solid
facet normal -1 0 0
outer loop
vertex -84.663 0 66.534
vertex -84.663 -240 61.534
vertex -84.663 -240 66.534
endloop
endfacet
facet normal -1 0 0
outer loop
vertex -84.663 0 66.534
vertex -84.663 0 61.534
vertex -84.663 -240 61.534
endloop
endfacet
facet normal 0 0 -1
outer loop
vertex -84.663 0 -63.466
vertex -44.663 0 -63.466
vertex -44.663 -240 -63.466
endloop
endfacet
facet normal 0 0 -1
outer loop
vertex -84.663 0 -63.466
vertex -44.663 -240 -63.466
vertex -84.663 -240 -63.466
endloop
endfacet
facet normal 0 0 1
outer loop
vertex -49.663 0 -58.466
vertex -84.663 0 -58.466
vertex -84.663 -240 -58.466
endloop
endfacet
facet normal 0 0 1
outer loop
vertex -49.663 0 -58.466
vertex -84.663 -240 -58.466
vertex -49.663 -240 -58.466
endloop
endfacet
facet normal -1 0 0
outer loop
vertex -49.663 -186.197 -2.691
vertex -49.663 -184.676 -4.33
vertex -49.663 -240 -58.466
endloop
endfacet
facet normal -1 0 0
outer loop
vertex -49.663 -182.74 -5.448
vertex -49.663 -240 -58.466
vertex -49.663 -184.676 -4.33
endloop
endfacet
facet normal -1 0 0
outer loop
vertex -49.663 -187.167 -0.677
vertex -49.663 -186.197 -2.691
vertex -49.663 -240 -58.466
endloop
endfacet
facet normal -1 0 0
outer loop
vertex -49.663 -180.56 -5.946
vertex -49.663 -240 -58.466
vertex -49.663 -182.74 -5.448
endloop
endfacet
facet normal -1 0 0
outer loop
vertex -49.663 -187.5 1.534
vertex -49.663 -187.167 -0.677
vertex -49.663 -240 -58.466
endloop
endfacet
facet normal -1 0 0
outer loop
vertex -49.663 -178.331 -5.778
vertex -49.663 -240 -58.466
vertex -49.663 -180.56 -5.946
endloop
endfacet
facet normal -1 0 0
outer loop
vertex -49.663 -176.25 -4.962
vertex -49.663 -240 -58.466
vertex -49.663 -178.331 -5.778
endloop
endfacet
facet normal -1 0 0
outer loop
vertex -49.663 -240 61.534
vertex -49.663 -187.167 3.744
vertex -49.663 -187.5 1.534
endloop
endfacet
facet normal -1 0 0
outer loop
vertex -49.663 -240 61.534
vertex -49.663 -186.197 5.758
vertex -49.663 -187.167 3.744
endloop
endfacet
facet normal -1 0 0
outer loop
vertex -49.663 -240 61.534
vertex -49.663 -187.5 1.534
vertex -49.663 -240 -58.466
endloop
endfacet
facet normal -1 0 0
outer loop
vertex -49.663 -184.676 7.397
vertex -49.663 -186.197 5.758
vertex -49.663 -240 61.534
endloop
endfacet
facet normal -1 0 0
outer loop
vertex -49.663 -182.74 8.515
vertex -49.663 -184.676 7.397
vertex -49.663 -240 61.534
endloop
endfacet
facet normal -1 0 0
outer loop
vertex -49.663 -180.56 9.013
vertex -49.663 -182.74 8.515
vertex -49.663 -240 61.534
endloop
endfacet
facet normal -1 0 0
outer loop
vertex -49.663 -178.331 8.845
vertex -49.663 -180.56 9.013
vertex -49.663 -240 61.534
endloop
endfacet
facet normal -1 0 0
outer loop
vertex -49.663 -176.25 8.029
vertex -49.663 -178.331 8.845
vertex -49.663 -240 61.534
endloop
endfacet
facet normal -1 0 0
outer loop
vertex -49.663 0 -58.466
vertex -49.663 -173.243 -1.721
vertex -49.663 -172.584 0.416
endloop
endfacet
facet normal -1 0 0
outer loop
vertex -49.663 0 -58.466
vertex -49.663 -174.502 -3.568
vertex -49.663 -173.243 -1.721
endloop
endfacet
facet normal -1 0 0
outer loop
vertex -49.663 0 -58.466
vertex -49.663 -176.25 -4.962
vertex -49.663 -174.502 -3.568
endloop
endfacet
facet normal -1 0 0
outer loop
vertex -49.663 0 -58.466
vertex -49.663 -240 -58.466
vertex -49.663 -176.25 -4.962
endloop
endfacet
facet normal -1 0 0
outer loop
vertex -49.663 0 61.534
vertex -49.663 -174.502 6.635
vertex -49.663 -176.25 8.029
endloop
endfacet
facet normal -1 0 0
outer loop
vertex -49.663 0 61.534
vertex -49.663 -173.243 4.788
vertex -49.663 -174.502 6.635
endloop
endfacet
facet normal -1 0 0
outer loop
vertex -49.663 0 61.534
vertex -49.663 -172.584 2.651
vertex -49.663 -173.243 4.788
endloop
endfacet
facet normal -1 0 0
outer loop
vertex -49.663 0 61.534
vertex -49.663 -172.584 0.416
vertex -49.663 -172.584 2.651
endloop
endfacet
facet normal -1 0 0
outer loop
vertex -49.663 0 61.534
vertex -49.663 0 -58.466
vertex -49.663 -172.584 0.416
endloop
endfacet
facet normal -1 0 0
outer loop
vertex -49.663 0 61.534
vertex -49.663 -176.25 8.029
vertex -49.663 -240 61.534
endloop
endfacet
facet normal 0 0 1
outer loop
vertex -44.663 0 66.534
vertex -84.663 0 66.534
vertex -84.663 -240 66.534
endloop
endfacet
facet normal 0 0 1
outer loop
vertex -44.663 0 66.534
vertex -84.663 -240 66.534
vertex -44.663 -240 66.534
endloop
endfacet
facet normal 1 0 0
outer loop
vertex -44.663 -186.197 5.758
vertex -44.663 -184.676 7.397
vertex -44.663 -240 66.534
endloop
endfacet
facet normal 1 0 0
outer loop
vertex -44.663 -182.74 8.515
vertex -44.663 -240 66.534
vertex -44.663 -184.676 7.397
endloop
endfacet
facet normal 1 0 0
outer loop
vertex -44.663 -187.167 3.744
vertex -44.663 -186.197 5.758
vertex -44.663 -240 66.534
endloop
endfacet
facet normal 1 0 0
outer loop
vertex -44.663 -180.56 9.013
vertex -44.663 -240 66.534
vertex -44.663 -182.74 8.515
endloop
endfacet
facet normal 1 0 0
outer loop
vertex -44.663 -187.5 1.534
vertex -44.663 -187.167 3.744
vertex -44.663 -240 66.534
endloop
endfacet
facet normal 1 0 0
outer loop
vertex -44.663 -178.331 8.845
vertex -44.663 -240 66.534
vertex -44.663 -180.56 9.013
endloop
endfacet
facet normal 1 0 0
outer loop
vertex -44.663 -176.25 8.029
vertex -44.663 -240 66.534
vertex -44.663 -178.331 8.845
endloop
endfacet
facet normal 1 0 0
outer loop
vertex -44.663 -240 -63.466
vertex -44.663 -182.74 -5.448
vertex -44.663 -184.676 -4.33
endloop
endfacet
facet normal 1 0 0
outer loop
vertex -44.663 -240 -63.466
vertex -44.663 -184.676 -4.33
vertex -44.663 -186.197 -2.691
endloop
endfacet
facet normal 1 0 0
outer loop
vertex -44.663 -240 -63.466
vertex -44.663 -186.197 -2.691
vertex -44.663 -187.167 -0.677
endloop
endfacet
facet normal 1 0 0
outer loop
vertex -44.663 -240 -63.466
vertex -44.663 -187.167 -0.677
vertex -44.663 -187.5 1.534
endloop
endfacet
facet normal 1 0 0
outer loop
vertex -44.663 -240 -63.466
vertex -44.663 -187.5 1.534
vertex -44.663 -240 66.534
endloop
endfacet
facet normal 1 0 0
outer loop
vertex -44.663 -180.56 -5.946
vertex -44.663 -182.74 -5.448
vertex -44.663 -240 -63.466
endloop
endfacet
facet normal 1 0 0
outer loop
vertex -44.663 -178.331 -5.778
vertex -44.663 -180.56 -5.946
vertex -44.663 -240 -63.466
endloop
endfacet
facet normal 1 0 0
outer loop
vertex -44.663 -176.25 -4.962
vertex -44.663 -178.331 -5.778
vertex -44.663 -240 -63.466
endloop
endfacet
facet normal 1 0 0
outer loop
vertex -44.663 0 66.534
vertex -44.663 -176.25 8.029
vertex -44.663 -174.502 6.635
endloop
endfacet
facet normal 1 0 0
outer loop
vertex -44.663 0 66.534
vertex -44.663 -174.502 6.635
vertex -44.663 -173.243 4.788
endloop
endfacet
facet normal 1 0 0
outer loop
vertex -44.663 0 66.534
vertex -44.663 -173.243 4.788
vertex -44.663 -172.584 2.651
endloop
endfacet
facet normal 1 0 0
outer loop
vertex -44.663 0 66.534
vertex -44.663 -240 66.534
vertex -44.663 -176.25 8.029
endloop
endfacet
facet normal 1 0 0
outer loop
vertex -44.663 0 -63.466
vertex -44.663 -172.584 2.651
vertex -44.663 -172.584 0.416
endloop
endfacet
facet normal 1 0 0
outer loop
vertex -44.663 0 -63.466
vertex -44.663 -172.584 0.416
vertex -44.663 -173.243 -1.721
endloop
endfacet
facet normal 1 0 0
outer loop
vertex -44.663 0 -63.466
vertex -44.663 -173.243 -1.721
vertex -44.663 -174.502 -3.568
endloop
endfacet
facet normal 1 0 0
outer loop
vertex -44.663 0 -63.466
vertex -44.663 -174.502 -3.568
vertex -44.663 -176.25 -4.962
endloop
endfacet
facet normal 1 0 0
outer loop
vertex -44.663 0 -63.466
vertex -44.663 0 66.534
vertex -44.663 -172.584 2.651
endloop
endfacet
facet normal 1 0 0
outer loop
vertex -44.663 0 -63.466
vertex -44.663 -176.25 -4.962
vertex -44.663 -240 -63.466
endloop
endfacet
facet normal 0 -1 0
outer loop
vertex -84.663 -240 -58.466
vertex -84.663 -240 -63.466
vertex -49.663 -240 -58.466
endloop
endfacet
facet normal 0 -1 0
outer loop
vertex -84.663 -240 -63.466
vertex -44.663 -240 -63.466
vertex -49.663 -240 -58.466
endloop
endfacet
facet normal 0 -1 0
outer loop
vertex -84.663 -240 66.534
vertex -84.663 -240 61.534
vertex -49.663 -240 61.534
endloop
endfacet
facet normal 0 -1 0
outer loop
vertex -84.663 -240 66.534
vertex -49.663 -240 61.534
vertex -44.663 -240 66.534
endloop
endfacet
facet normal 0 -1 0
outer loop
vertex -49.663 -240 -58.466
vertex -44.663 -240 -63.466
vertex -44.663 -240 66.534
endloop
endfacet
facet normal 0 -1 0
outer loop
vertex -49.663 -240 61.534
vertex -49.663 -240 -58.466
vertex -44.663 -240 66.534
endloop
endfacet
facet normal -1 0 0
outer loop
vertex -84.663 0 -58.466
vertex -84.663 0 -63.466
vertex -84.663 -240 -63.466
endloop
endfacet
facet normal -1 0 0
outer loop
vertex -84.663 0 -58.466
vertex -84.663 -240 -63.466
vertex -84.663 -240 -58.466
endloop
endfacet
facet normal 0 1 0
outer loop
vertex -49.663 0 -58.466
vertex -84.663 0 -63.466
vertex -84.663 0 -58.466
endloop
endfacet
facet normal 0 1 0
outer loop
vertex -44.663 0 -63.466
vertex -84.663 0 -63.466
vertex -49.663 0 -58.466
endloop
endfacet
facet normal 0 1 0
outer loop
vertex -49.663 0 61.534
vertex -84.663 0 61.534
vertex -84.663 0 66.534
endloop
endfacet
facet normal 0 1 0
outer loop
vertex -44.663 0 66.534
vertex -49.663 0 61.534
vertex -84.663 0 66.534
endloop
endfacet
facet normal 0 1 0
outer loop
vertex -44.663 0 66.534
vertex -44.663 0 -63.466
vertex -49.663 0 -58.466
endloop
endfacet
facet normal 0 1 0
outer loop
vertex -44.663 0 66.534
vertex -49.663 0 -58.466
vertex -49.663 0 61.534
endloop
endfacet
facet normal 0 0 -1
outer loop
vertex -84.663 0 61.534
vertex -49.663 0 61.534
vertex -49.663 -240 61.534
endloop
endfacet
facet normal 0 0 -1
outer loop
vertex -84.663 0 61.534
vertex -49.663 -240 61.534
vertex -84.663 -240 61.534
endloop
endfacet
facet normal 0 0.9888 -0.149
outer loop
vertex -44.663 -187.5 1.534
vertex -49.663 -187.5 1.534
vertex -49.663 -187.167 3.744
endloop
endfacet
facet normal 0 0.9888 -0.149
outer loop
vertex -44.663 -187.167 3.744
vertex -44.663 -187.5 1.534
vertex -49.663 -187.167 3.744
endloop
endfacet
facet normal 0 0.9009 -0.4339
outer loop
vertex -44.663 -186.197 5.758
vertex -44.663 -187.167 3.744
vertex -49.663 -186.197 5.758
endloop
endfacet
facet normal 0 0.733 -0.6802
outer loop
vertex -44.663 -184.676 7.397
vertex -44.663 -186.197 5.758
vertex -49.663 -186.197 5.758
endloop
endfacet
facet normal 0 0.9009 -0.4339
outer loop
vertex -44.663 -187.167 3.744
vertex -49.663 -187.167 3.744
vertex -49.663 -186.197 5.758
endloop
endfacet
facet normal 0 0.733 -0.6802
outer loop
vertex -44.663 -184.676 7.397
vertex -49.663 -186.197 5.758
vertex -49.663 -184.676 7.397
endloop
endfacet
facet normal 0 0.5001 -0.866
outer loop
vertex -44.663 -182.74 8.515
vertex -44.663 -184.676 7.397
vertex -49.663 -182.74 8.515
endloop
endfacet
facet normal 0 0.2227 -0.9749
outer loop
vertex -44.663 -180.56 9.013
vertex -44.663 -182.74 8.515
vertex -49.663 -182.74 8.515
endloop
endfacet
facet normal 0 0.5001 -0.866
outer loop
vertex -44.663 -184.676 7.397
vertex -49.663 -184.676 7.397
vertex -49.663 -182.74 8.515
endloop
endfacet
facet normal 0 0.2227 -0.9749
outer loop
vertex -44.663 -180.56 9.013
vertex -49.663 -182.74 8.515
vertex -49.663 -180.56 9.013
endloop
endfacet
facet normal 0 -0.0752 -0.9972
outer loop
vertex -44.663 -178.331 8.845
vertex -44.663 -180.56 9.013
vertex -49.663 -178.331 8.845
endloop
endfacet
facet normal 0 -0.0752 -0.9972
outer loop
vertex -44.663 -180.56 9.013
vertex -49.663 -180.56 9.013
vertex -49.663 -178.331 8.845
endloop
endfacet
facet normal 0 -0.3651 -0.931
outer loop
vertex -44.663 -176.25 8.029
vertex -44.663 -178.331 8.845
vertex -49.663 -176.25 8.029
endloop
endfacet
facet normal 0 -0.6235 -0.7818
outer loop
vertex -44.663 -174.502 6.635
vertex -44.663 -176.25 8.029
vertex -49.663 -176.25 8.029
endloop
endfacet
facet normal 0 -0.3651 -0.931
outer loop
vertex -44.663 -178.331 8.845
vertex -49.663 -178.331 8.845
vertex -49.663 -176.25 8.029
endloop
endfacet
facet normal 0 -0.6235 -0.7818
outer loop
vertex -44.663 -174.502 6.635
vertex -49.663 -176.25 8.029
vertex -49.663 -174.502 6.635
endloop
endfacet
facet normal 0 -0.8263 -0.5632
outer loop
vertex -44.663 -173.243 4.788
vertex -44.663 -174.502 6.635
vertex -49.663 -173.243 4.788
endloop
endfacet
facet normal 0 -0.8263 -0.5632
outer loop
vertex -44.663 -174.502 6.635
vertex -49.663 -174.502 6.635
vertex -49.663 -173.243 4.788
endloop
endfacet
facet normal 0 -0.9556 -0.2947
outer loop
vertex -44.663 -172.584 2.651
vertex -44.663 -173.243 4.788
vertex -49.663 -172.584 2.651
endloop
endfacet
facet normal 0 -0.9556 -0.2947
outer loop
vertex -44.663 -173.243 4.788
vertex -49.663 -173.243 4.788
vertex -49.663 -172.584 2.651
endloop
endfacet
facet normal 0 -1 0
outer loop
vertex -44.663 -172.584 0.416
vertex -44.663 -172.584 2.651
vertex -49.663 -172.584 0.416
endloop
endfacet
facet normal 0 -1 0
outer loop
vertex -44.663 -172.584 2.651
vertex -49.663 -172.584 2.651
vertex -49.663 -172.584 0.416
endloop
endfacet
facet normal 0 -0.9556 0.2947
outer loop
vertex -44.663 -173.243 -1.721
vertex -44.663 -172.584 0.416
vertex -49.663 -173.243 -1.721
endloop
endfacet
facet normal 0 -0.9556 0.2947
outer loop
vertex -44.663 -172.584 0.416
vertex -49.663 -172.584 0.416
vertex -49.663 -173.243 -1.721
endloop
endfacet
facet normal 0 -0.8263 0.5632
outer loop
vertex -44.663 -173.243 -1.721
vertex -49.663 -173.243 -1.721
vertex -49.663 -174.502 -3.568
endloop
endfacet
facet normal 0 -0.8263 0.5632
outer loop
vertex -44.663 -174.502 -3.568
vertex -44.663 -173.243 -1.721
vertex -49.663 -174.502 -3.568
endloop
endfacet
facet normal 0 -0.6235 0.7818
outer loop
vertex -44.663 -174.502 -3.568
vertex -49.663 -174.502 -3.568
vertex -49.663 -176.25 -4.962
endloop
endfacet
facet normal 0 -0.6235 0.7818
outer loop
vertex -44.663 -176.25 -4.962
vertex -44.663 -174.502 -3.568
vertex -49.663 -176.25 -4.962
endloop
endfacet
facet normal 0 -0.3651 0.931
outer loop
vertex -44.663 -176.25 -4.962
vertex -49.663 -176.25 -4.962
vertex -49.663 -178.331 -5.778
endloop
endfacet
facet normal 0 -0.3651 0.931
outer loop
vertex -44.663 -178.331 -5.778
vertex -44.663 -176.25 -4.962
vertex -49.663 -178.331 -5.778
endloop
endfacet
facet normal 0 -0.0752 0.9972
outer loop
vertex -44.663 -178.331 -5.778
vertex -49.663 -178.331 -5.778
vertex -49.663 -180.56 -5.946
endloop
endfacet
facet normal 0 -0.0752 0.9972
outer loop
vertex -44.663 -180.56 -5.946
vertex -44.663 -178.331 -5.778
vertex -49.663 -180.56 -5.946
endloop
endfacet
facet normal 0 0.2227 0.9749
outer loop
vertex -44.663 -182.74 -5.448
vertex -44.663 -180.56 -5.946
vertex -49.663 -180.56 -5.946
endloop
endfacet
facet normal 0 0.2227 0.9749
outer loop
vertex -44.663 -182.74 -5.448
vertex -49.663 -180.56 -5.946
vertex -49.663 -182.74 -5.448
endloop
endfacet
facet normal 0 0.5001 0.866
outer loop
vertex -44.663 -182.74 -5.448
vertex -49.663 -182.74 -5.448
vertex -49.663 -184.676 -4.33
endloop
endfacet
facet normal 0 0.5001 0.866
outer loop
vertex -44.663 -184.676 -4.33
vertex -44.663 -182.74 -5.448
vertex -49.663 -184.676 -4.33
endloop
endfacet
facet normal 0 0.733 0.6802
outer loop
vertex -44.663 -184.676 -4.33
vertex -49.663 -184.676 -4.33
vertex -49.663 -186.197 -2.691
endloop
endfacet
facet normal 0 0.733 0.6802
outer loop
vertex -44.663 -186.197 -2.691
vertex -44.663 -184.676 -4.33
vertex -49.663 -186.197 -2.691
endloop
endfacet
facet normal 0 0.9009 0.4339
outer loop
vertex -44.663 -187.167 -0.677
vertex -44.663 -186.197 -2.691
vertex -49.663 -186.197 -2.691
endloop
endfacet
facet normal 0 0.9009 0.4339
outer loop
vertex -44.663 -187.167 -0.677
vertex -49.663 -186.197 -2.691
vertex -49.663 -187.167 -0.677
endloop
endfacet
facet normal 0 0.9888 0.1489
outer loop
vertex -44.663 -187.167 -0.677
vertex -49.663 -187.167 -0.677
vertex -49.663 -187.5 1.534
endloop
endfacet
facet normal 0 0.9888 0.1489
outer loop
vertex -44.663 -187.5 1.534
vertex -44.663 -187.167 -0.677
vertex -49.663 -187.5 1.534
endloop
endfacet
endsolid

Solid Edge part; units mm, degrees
sketch "Sketch1" plane through (0, 0, 0) normal (0, -1, 0) x (1, 0, 0)
  line L0 (-84.6631, 66.5335) -> (-44.6631, 66.5335)
  line L1 (-44.6631, 66.5335) -> (-44.6631, -63.4665)
  line L2 (-44.6631, -63.4665) -> (-84.6631, -63.4665)
  line L3 (-84.6631, -63.4665) -> (-84.6631, -58.4665)
  line L4 (-84.6631, -58.4665) -> (-49.6631, -58.4665)
  line L5 (-49.6631, -58.4665) -> (-49.6631, 61.5335)
  line L6 (-49.6631, 61.5335) -> (-84.6631, 61.5335)
  line L7 (-84.6631, 61.5335) -> (-84.6631, 66.5335)
  dimension "D1" = 130
  dimension "D2" = 5
  dimension "D3" = 5
  dimension "D4" = 40
  dimension "D5" = 5
extrude "Protrusion1" add sketch "Sketch1" along normal blind 240
sketch "Sketch2" plane through (-49.6631, -60, 1.5335) normal (-1, 0, 0) x (0, -1, 0)
  circle A0 centre (120, 0) radius 7.5
  dimension "D1" = 60
extrude "Cutout1" cut sketch "Sketch2" against normal through all
properties material "Aluminum, 6061-T6"
